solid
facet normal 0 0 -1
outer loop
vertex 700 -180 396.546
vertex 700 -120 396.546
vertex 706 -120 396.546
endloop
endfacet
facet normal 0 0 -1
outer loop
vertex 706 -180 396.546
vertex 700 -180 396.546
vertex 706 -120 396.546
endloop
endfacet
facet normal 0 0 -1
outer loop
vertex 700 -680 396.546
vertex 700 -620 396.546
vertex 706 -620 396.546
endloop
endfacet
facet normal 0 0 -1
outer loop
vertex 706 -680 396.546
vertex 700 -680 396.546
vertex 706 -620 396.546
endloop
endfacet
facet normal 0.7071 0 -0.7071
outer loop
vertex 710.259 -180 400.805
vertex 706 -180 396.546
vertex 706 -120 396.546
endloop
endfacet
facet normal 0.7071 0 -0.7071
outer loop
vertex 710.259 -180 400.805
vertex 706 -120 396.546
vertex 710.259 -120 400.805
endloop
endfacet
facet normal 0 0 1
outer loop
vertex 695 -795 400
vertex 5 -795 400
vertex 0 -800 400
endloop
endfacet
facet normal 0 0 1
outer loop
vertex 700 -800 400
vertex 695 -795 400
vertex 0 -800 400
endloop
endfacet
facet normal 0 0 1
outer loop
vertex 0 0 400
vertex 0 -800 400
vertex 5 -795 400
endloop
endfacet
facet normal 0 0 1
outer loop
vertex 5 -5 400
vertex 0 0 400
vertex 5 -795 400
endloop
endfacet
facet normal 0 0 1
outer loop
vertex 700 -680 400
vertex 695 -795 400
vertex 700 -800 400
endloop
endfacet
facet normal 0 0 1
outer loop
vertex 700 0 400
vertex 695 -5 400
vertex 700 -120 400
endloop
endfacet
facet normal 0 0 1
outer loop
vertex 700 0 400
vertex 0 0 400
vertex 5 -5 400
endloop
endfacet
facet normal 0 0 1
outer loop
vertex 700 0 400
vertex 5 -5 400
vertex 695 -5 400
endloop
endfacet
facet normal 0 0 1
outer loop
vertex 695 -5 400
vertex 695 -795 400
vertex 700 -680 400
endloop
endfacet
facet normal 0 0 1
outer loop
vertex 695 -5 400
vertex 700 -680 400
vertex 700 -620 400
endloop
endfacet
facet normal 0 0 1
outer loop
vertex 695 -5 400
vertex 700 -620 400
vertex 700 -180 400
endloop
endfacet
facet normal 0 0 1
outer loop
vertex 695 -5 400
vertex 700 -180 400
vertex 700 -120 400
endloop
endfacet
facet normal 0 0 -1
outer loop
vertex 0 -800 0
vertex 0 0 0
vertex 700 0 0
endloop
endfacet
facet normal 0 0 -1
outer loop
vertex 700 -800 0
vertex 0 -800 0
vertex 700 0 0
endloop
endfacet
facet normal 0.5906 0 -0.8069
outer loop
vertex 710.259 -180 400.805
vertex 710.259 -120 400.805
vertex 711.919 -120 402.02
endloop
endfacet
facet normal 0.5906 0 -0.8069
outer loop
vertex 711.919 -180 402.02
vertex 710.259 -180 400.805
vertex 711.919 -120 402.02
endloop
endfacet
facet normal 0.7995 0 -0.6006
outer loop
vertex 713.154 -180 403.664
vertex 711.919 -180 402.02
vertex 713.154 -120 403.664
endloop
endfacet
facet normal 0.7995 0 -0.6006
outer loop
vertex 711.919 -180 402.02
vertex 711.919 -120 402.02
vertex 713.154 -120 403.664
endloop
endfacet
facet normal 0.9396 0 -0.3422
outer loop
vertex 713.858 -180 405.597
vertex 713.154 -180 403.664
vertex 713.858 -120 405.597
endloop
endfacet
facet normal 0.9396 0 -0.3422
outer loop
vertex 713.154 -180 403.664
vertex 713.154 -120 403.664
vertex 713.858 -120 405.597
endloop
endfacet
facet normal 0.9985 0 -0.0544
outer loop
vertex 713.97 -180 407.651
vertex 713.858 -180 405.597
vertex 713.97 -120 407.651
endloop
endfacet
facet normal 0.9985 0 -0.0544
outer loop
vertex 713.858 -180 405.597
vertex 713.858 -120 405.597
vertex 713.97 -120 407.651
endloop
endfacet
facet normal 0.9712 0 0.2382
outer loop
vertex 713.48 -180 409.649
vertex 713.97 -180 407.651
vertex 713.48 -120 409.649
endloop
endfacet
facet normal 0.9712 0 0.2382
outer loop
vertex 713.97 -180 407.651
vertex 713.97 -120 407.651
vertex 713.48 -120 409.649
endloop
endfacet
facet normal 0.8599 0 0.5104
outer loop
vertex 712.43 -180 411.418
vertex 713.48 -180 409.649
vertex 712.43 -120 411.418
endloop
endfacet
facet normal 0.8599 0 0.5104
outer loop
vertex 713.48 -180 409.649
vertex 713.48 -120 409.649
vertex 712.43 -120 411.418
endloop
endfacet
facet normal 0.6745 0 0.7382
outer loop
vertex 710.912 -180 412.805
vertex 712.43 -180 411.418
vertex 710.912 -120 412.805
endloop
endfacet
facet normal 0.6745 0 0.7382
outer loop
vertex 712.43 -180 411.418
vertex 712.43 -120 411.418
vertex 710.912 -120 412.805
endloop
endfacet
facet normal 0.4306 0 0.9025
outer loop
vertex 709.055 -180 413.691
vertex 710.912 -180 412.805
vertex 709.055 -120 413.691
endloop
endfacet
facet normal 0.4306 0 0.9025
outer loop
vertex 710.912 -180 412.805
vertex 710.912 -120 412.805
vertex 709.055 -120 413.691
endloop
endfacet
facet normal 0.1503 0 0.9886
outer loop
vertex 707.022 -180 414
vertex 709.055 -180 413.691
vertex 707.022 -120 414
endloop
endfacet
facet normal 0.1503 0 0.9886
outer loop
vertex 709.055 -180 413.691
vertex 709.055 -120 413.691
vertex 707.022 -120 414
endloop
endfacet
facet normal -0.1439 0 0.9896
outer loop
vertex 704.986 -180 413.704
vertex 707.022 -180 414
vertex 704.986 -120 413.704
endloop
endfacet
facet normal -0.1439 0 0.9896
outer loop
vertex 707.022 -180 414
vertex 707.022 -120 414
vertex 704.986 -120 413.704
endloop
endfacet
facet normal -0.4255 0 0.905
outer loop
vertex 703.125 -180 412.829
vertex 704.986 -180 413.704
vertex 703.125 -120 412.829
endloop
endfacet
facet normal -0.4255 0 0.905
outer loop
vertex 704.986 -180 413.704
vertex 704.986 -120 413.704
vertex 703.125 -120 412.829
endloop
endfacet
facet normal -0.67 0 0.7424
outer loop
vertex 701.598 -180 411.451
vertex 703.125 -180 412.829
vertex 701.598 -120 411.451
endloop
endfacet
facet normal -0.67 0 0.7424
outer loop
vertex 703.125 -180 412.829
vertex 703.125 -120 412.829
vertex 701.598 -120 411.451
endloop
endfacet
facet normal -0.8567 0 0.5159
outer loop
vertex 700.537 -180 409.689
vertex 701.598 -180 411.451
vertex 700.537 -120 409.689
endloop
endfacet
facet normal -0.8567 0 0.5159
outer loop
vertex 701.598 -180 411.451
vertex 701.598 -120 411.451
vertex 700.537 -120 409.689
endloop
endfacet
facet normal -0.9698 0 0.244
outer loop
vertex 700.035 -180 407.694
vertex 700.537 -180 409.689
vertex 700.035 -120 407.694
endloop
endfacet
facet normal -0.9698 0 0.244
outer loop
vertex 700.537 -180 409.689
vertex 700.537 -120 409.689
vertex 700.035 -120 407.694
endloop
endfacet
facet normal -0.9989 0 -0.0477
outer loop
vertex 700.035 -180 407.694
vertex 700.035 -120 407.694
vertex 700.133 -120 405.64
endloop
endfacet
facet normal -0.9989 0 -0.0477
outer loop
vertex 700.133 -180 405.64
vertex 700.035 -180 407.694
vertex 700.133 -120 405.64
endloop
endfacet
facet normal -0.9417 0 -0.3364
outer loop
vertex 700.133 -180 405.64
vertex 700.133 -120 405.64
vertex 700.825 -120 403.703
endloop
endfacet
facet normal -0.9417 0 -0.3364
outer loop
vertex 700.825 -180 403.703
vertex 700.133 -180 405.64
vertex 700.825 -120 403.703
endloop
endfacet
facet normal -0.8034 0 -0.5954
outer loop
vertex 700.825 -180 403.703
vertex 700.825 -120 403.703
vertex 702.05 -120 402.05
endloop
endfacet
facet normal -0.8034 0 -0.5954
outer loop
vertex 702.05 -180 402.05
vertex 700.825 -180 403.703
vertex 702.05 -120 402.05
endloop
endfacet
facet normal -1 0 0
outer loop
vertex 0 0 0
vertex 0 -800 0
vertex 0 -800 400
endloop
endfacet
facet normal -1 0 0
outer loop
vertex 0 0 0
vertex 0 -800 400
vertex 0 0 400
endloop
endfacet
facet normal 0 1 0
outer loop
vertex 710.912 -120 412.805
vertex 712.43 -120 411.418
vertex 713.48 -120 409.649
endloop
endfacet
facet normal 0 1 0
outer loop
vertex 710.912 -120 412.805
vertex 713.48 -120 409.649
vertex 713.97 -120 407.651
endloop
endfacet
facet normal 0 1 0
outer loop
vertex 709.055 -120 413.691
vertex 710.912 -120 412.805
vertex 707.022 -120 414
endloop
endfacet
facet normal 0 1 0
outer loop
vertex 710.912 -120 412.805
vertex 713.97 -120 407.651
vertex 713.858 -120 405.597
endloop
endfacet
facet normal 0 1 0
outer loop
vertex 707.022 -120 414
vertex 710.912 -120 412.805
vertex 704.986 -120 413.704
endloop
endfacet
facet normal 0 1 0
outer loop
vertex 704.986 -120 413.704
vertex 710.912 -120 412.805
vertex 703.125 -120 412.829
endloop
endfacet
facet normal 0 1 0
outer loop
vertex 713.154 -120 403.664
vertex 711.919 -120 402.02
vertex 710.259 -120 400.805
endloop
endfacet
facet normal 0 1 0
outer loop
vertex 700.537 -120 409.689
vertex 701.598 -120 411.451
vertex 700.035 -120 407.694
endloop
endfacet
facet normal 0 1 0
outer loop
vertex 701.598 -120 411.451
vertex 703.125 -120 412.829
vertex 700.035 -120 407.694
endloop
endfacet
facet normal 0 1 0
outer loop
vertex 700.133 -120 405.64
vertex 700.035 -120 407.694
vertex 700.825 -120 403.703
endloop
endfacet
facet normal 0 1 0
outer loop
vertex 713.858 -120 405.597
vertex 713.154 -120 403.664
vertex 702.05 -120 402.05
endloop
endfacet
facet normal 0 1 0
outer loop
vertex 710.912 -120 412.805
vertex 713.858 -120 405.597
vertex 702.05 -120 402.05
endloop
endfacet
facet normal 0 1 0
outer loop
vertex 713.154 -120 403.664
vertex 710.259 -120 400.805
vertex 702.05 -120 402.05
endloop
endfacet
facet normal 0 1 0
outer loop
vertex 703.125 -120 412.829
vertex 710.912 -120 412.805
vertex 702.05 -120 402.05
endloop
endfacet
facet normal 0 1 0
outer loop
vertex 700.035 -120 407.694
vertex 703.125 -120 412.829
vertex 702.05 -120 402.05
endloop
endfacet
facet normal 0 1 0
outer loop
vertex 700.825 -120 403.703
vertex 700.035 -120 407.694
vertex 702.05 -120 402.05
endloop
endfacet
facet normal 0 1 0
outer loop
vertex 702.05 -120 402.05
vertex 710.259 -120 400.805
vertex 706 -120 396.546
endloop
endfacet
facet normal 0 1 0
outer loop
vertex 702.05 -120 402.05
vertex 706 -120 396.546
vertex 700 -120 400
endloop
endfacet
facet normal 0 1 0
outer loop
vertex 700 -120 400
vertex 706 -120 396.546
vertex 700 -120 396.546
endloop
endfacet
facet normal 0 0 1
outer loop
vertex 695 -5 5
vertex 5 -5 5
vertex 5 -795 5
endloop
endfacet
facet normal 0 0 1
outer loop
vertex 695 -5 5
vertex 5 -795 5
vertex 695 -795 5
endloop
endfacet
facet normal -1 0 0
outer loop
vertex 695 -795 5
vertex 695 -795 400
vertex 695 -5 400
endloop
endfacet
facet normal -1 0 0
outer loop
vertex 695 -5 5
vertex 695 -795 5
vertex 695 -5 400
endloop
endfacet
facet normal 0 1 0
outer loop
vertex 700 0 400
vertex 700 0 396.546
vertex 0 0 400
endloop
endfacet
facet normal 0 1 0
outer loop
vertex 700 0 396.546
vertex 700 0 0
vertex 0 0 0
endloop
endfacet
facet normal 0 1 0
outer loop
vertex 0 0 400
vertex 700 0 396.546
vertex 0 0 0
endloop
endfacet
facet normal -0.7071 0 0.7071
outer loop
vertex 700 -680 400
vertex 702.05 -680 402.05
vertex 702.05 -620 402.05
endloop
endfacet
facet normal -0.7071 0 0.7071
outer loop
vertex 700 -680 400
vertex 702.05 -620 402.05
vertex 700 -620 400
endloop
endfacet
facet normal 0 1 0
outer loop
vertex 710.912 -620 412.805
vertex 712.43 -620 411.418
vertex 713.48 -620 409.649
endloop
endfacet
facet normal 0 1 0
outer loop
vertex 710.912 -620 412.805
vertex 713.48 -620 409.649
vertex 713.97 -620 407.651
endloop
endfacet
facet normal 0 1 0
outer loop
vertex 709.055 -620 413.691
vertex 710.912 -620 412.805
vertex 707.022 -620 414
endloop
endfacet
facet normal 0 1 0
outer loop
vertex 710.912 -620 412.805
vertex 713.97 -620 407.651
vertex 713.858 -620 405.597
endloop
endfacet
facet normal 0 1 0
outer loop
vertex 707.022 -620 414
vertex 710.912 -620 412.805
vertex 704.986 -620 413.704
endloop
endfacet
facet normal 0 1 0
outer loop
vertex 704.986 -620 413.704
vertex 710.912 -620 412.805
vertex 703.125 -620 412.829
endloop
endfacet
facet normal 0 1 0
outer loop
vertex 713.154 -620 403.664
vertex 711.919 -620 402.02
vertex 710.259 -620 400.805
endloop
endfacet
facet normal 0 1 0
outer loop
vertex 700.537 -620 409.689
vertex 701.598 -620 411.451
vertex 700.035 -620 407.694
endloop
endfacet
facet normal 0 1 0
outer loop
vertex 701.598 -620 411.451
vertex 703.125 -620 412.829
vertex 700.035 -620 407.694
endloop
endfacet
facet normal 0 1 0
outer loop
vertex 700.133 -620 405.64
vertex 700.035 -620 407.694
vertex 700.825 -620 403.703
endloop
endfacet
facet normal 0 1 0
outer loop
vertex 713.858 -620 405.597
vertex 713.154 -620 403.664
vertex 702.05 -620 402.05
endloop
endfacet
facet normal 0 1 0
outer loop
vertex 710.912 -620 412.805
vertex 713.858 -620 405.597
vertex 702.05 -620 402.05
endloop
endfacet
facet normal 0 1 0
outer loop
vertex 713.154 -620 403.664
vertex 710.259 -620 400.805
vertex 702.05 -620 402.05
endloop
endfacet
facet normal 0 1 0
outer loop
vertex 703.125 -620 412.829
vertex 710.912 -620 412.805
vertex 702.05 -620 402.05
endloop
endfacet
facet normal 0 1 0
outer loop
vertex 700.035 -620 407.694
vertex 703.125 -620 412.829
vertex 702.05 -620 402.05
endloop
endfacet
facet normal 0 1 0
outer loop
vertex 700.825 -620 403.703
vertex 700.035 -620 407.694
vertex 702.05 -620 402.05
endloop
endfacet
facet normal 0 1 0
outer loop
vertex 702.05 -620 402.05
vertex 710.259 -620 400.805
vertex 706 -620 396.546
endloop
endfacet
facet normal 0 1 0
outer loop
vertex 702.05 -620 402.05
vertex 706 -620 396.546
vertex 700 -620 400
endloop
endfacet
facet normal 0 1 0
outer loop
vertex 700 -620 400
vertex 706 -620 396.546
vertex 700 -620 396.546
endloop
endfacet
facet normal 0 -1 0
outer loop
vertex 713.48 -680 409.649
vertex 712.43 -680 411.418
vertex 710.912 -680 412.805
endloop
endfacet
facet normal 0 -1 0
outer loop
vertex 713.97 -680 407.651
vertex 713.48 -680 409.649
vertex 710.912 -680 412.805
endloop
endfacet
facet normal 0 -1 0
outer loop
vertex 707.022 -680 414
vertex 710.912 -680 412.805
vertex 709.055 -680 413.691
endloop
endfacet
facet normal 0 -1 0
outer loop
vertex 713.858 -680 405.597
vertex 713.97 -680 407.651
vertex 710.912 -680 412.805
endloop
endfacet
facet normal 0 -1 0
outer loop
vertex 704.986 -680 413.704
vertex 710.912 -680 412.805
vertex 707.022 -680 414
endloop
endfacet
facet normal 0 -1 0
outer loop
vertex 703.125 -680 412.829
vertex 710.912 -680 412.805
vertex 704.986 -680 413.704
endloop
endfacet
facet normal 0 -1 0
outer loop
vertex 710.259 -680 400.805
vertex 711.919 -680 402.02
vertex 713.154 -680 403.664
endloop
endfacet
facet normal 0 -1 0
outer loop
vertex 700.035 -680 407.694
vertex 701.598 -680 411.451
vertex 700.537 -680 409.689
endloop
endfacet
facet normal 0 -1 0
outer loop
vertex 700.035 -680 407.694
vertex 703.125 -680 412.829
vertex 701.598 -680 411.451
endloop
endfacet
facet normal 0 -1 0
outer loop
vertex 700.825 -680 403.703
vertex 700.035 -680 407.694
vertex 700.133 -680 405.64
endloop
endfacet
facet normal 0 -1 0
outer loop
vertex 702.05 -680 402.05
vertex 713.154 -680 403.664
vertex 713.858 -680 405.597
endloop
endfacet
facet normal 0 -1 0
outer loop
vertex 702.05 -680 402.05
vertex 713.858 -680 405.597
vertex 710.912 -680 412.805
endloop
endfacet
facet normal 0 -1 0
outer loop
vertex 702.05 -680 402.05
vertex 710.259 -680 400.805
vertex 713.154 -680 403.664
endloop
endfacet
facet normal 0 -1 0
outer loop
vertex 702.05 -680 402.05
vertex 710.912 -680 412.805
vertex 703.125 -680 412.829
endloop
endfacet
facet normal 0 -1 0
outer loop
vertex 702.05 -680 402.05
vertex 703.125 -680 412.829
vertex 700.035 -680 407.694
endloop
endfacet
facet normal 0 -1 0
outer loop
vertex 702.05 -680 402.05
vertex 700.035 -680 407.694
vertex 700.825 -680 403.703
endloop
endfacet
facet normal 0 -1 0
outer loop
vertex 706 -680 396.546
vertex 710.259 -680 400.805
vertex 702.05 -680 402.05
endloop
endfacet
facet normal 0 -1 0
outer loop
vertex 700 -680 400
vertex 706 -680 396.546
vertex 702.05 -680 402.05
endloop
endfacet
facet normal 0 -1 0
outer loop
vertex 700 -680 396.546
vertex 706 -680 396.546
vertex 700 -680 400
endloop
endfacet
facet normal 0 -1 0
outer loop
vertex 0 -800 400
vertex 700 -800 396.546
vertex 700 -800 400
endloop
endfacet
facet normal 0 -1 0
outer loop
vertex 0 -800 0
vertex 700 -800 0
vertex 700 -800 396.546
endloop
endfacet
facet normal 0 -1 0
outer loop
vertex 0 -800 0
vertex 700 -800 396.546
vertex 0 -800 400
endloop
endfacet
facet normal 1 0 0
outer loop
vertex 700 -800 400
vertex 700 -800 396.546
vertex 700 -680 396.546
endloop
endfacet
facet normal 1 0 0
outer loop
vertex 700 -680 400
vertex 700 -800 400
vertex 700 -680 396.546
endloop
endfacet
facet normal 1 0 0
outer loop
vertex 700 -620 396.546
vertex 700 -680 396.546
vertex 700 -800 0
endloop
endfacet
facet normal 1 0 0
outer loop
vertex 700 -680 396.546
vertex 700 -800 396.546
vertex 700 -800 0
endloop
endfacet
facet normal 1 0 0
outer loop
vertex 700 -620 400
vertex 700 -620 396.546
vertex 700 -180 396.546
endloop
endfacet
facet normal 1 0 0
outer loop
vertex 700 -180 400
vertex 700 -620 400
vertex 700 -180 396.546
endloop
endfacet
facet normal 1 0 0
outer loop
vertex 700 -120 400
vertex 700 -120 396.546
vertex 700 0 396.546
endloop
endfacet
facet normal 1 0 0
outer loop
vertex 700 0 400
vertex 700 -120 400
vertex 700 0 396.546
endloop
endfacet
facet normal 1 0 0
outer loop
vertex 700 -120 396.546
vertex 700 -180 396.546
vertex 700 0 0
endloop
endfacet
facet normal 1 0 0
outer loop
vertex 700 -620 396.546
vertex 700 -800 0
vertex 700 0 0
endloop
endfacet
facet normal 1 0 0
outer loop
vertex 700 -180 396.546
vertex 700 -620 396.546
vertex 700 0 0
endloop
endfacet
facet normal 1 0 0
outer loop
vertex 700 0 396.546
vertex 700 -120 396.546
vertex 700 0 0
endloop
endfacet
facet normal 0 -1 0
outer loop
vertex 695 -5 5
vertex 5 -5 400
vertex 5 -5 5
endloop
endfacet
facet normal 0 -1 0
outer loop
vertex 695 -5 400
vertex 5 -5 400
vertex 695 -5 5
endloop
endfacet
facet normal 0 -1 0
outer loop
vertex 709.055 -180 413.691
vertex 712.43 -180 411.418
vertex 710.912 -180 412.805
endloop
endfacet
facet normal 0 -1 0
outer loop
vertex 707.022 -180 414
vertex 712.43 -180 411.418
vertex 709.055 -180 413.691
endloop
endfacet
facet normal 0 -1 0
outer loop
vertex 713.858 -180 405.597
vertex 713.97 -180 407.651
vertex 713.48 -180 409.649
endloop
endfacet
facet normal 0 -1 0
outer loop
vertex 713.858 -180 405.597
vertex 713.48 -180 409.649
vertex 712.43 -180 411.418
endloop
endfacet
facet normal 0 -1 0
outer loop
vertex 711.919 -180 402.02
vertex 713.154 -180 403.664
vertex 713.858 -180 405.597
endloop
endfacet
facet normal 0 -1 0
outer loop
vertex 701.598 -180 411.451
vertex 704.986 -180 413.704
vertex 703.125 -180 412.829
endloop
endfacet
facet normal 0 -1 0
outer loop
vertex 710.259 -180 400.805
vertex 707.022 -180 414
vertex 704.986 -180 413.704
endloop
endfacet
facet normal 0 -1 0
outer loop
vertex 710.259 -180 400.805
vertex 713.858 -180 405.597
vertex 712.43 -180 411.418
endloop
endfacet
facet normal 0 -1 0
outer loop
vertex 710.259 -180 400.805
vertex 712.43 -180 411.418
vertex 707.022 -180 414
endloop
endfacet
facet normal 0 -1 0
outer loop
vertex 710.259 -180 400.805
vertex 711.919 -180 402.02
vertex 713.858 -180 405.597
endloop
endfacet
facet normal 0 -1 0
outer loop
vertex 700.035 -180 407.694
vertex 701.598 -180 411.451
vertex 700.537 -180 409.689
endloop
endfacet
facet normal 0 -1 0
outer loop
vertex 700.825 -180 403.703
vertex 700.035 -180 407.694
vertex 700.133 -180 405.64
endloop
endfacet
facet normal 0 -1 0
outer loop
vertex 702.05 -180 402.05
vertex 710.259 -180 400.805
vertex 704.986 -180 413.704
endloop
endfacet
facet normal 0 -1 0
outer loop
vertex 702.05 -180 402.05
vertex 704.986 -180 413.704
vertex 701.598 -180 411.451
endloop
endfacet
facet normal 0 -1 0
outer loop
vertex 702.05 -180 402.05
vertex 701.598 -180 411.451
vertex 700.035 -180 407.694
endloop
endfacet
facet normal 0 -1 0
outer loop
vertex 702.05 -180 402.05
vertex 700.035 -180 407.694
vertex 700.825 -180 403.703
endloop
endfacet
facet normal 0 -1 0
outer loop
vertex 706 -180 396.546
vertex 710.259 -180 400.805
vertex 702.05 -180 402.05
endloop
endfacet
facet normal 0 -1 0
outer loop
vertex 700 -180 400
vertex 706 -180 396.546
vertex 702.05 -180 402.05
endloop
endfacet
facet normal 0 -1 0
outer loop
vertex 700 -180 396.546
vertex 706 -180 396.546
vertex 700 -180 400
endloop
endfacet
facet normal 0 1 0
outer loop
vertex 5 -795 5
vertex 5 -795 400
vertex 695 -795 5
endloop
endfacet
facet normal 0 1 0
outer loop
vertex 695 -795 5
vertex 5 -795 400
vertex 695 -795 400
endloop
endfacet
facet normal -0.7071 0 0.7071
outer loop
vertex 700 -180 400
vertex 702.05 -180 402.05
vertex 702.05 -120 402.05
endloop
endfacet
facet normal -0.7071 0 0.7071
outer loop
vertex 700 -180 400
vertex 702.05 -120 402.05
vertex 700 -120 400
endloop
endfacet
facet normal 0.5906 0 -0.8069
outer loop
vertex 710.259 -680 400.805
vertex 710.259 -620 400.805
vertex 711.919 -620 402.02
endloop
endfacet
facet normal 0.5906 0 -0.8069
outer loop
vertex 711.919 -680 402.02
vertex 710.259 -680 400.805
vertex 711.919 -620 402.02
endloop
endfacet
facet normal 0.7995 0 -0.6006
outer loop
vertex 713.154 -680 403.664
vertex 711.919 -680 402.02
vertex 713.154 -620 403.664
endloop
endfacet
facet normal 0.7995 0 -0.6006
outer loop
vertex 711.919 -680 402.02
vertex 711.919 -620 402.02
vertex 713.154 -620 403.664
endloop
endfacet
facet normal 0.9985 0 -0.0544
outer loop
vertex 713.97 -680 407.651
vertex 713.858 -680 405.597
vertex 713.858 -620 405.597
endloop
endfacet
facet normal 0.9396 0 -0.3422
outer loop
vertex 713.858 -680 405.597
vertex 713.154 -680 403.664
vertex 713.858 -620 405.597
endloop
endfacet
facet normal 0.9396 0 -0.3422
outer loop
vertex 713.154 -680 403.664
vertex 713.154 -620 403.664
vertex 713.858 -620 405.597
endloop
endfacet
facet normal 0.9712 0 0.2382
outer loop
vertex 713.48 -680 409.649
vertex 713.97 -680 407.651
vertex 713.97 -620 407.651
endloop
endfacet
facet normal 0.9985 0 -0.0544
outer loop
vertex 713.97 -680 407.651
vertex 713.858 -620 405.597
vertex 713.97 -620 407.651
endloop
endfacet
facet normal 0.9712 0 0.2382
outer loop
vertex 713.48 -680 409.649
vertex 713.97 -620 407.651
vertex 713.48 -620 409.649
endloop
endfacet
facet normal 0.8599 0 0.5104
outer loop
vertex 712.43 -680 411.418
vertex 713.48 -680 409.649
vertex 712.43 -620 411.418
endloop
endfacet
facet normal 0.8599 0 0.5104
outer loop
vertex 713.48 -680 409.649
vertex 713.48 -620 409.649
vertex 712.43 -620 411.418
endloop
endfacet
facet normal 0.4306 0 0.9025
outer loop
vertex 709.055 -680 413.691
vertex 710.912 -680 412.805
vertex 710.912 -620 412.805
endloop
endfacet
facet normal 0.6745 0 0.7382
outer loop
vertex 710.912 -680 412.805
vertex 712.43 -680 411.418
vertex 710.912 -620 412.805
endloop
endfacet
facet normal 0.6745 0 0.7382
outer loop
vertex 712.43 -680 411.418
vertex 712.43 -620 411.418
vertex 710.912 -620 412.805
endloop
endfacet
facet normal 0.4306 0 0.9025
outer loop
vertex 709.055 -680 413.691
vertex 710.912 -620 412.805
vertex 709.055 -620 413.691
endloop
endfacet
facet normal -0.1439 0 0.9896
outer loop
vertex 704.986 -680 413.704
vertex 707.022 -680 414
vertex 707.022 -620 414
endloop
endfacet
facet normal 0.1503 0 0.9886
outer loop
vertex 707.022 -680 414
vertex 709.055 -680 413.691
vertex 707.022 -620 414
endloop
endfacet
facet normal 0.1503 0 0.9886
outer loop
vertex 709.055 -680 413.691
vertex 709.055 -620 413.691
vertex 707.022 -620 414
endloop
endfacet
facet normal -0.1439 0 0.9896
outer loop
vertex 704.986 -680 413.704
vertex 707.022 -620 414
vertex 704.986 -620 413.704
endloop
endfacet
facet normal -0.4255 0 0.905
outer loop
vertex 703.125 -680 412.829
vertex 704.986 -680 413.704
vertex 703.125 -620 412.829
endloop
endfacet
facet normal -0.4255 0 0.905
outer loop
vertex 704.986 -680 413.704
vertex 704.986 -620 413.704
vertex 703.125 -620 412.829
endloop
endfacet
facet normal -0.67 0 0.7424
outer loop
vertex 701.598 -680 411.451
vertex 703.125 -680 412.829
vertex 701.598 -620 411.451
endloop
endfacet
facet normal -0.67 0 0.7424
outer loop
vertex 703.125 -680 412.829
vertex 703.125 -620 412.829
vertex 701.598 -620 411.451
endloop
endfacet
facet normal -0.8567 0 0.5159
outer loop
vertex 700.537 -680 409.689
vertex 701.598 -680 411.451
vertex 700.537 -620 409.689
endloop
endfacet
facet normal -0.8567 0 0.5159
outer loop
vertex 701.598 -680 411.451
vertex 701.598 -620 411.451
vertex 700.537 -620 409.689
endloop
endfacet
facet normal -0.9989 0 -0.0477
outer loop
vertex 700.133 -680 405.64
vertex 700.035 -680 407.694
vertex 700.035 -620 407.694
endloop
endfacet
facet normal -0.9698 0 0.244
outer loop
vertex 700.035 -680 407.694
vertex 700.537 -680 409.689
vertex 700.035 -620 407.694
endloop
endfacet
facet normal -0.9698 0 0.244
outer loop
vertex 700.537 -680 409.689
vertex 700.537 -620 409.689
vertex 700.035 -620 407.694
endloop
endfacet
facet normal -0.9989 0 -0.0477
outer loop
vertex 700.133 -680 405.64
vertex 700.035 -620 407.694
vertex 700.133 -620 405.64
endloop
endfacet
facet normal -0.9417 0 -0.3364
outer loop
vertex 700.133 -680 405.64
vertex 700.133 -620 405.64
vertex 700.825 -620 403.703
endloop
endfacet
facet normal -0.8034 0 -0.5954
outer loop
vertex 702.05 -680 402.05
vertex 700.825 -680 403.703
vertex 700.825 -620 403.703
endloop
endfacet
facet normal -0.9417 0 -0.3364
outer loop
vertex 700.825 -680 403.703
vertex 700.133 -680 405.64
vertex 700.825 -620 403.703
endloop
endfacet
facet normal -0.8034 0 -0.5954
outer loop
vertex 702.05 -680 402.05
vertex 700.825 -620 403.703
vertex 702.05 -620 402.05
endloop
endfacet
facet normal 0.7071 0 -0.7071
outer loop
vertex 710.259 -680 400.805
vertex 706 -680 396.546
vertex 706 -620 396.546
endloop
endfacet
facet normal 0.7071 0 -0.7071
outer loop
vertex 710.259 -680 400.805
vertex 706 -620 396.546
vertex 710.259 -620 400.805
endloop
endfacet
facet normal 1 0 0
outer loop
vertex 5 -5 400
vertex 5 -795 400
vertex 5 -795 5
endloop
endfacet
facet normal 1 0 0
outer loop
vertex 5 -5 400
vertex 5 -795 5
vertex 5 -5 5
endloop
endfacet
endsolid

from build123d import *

# Parameters (mm, degrees)
CROQUIS1_W              = 700
CROQUIS1_H              = 800
SALIENTE_EXTRUIR1_DEPTH = 400
CROQUIS2_W              = 690
CROQUIS2_H              = 790
CORTAR_EXTRUIR1_DEPTH   = 395
SALIENTE_EXTRUIR2_DEPTH = 800
CROQUIS4_W              = 56.686989083
CROQUIS4_H              = 120
CROQUIS4_H_2            = 440
CORTAR_EXTRUIR2_DEPTH   = 450


with BuildPart() as part:
    # Croquis1 → Saliente-Extruir1 (new body)
    with BuildSketch(Plane.XY):
        with Locations((350, -400)):
            Rectangle(CROQUIS1_W, CROQUIS1_H)
    extrude(amount=SALIENTE_EXTRUIR1_DEPTH)

    # Croquis2 → Cortar-Extruir1 (cut)
    with BuildSketch(Plane.XY.offset(400)):
        with Locations((350, -400)):
            Rectangle(CROQUIS2_W, CROQUIS2_H)
    extrude(amount=-CORTAR_EXTRUIR1_DEPTH, mode=Mode.SUBTRACT)

    # Croquis3 → Saliente-Extruir2 (add)
    with BuildSketch(Plane(origin=(0, 0, 0), x_dir=(1, 0, 0), z_dir=(0, 1, 0))):
        with BuildLine():
            Line((700, -396.545914708), (706, -396.545914708))
            Line((706, -396.545914708), (710.25902772, -400.804942428))
            ThreePointArc((710.25902772, -400.804942428), (708.049920297, -413.920814068), (702.050252532, -402.050252532))
            Line((702.050252532, -402.050252532), (700, -400))
            Line((700, -400), (700, -396.545914708))
        make_face()
    extrude(amount=-SALIENTE_EXTRUIR2_DEPTH)

    # Croquis4 → Cortar-Extruir2 (cut)
    with BuildSketch(Plane(origin=(0, 0, 0), x_dir=(-1, 0, 0), z_dir=(0, 0, -1))):
        with Locations((-728.343494542, -60)):
            Rectangle(CROQUIS4_W, CROQUIS4_H)
        with Locations((-728.343494542, -740)):
            Rectangle(CROQUIS4_W, CROQUIS4_H)
        with Locations((-728.343494542, -400)):
            Rectangle(CROQUIS4_W, CROQUIS4_H_2)
    extrude(amount=-CORTAR_EXTRUIR2_DEPTH, mode=Mode.SUBTRACT)


solid = part.part
